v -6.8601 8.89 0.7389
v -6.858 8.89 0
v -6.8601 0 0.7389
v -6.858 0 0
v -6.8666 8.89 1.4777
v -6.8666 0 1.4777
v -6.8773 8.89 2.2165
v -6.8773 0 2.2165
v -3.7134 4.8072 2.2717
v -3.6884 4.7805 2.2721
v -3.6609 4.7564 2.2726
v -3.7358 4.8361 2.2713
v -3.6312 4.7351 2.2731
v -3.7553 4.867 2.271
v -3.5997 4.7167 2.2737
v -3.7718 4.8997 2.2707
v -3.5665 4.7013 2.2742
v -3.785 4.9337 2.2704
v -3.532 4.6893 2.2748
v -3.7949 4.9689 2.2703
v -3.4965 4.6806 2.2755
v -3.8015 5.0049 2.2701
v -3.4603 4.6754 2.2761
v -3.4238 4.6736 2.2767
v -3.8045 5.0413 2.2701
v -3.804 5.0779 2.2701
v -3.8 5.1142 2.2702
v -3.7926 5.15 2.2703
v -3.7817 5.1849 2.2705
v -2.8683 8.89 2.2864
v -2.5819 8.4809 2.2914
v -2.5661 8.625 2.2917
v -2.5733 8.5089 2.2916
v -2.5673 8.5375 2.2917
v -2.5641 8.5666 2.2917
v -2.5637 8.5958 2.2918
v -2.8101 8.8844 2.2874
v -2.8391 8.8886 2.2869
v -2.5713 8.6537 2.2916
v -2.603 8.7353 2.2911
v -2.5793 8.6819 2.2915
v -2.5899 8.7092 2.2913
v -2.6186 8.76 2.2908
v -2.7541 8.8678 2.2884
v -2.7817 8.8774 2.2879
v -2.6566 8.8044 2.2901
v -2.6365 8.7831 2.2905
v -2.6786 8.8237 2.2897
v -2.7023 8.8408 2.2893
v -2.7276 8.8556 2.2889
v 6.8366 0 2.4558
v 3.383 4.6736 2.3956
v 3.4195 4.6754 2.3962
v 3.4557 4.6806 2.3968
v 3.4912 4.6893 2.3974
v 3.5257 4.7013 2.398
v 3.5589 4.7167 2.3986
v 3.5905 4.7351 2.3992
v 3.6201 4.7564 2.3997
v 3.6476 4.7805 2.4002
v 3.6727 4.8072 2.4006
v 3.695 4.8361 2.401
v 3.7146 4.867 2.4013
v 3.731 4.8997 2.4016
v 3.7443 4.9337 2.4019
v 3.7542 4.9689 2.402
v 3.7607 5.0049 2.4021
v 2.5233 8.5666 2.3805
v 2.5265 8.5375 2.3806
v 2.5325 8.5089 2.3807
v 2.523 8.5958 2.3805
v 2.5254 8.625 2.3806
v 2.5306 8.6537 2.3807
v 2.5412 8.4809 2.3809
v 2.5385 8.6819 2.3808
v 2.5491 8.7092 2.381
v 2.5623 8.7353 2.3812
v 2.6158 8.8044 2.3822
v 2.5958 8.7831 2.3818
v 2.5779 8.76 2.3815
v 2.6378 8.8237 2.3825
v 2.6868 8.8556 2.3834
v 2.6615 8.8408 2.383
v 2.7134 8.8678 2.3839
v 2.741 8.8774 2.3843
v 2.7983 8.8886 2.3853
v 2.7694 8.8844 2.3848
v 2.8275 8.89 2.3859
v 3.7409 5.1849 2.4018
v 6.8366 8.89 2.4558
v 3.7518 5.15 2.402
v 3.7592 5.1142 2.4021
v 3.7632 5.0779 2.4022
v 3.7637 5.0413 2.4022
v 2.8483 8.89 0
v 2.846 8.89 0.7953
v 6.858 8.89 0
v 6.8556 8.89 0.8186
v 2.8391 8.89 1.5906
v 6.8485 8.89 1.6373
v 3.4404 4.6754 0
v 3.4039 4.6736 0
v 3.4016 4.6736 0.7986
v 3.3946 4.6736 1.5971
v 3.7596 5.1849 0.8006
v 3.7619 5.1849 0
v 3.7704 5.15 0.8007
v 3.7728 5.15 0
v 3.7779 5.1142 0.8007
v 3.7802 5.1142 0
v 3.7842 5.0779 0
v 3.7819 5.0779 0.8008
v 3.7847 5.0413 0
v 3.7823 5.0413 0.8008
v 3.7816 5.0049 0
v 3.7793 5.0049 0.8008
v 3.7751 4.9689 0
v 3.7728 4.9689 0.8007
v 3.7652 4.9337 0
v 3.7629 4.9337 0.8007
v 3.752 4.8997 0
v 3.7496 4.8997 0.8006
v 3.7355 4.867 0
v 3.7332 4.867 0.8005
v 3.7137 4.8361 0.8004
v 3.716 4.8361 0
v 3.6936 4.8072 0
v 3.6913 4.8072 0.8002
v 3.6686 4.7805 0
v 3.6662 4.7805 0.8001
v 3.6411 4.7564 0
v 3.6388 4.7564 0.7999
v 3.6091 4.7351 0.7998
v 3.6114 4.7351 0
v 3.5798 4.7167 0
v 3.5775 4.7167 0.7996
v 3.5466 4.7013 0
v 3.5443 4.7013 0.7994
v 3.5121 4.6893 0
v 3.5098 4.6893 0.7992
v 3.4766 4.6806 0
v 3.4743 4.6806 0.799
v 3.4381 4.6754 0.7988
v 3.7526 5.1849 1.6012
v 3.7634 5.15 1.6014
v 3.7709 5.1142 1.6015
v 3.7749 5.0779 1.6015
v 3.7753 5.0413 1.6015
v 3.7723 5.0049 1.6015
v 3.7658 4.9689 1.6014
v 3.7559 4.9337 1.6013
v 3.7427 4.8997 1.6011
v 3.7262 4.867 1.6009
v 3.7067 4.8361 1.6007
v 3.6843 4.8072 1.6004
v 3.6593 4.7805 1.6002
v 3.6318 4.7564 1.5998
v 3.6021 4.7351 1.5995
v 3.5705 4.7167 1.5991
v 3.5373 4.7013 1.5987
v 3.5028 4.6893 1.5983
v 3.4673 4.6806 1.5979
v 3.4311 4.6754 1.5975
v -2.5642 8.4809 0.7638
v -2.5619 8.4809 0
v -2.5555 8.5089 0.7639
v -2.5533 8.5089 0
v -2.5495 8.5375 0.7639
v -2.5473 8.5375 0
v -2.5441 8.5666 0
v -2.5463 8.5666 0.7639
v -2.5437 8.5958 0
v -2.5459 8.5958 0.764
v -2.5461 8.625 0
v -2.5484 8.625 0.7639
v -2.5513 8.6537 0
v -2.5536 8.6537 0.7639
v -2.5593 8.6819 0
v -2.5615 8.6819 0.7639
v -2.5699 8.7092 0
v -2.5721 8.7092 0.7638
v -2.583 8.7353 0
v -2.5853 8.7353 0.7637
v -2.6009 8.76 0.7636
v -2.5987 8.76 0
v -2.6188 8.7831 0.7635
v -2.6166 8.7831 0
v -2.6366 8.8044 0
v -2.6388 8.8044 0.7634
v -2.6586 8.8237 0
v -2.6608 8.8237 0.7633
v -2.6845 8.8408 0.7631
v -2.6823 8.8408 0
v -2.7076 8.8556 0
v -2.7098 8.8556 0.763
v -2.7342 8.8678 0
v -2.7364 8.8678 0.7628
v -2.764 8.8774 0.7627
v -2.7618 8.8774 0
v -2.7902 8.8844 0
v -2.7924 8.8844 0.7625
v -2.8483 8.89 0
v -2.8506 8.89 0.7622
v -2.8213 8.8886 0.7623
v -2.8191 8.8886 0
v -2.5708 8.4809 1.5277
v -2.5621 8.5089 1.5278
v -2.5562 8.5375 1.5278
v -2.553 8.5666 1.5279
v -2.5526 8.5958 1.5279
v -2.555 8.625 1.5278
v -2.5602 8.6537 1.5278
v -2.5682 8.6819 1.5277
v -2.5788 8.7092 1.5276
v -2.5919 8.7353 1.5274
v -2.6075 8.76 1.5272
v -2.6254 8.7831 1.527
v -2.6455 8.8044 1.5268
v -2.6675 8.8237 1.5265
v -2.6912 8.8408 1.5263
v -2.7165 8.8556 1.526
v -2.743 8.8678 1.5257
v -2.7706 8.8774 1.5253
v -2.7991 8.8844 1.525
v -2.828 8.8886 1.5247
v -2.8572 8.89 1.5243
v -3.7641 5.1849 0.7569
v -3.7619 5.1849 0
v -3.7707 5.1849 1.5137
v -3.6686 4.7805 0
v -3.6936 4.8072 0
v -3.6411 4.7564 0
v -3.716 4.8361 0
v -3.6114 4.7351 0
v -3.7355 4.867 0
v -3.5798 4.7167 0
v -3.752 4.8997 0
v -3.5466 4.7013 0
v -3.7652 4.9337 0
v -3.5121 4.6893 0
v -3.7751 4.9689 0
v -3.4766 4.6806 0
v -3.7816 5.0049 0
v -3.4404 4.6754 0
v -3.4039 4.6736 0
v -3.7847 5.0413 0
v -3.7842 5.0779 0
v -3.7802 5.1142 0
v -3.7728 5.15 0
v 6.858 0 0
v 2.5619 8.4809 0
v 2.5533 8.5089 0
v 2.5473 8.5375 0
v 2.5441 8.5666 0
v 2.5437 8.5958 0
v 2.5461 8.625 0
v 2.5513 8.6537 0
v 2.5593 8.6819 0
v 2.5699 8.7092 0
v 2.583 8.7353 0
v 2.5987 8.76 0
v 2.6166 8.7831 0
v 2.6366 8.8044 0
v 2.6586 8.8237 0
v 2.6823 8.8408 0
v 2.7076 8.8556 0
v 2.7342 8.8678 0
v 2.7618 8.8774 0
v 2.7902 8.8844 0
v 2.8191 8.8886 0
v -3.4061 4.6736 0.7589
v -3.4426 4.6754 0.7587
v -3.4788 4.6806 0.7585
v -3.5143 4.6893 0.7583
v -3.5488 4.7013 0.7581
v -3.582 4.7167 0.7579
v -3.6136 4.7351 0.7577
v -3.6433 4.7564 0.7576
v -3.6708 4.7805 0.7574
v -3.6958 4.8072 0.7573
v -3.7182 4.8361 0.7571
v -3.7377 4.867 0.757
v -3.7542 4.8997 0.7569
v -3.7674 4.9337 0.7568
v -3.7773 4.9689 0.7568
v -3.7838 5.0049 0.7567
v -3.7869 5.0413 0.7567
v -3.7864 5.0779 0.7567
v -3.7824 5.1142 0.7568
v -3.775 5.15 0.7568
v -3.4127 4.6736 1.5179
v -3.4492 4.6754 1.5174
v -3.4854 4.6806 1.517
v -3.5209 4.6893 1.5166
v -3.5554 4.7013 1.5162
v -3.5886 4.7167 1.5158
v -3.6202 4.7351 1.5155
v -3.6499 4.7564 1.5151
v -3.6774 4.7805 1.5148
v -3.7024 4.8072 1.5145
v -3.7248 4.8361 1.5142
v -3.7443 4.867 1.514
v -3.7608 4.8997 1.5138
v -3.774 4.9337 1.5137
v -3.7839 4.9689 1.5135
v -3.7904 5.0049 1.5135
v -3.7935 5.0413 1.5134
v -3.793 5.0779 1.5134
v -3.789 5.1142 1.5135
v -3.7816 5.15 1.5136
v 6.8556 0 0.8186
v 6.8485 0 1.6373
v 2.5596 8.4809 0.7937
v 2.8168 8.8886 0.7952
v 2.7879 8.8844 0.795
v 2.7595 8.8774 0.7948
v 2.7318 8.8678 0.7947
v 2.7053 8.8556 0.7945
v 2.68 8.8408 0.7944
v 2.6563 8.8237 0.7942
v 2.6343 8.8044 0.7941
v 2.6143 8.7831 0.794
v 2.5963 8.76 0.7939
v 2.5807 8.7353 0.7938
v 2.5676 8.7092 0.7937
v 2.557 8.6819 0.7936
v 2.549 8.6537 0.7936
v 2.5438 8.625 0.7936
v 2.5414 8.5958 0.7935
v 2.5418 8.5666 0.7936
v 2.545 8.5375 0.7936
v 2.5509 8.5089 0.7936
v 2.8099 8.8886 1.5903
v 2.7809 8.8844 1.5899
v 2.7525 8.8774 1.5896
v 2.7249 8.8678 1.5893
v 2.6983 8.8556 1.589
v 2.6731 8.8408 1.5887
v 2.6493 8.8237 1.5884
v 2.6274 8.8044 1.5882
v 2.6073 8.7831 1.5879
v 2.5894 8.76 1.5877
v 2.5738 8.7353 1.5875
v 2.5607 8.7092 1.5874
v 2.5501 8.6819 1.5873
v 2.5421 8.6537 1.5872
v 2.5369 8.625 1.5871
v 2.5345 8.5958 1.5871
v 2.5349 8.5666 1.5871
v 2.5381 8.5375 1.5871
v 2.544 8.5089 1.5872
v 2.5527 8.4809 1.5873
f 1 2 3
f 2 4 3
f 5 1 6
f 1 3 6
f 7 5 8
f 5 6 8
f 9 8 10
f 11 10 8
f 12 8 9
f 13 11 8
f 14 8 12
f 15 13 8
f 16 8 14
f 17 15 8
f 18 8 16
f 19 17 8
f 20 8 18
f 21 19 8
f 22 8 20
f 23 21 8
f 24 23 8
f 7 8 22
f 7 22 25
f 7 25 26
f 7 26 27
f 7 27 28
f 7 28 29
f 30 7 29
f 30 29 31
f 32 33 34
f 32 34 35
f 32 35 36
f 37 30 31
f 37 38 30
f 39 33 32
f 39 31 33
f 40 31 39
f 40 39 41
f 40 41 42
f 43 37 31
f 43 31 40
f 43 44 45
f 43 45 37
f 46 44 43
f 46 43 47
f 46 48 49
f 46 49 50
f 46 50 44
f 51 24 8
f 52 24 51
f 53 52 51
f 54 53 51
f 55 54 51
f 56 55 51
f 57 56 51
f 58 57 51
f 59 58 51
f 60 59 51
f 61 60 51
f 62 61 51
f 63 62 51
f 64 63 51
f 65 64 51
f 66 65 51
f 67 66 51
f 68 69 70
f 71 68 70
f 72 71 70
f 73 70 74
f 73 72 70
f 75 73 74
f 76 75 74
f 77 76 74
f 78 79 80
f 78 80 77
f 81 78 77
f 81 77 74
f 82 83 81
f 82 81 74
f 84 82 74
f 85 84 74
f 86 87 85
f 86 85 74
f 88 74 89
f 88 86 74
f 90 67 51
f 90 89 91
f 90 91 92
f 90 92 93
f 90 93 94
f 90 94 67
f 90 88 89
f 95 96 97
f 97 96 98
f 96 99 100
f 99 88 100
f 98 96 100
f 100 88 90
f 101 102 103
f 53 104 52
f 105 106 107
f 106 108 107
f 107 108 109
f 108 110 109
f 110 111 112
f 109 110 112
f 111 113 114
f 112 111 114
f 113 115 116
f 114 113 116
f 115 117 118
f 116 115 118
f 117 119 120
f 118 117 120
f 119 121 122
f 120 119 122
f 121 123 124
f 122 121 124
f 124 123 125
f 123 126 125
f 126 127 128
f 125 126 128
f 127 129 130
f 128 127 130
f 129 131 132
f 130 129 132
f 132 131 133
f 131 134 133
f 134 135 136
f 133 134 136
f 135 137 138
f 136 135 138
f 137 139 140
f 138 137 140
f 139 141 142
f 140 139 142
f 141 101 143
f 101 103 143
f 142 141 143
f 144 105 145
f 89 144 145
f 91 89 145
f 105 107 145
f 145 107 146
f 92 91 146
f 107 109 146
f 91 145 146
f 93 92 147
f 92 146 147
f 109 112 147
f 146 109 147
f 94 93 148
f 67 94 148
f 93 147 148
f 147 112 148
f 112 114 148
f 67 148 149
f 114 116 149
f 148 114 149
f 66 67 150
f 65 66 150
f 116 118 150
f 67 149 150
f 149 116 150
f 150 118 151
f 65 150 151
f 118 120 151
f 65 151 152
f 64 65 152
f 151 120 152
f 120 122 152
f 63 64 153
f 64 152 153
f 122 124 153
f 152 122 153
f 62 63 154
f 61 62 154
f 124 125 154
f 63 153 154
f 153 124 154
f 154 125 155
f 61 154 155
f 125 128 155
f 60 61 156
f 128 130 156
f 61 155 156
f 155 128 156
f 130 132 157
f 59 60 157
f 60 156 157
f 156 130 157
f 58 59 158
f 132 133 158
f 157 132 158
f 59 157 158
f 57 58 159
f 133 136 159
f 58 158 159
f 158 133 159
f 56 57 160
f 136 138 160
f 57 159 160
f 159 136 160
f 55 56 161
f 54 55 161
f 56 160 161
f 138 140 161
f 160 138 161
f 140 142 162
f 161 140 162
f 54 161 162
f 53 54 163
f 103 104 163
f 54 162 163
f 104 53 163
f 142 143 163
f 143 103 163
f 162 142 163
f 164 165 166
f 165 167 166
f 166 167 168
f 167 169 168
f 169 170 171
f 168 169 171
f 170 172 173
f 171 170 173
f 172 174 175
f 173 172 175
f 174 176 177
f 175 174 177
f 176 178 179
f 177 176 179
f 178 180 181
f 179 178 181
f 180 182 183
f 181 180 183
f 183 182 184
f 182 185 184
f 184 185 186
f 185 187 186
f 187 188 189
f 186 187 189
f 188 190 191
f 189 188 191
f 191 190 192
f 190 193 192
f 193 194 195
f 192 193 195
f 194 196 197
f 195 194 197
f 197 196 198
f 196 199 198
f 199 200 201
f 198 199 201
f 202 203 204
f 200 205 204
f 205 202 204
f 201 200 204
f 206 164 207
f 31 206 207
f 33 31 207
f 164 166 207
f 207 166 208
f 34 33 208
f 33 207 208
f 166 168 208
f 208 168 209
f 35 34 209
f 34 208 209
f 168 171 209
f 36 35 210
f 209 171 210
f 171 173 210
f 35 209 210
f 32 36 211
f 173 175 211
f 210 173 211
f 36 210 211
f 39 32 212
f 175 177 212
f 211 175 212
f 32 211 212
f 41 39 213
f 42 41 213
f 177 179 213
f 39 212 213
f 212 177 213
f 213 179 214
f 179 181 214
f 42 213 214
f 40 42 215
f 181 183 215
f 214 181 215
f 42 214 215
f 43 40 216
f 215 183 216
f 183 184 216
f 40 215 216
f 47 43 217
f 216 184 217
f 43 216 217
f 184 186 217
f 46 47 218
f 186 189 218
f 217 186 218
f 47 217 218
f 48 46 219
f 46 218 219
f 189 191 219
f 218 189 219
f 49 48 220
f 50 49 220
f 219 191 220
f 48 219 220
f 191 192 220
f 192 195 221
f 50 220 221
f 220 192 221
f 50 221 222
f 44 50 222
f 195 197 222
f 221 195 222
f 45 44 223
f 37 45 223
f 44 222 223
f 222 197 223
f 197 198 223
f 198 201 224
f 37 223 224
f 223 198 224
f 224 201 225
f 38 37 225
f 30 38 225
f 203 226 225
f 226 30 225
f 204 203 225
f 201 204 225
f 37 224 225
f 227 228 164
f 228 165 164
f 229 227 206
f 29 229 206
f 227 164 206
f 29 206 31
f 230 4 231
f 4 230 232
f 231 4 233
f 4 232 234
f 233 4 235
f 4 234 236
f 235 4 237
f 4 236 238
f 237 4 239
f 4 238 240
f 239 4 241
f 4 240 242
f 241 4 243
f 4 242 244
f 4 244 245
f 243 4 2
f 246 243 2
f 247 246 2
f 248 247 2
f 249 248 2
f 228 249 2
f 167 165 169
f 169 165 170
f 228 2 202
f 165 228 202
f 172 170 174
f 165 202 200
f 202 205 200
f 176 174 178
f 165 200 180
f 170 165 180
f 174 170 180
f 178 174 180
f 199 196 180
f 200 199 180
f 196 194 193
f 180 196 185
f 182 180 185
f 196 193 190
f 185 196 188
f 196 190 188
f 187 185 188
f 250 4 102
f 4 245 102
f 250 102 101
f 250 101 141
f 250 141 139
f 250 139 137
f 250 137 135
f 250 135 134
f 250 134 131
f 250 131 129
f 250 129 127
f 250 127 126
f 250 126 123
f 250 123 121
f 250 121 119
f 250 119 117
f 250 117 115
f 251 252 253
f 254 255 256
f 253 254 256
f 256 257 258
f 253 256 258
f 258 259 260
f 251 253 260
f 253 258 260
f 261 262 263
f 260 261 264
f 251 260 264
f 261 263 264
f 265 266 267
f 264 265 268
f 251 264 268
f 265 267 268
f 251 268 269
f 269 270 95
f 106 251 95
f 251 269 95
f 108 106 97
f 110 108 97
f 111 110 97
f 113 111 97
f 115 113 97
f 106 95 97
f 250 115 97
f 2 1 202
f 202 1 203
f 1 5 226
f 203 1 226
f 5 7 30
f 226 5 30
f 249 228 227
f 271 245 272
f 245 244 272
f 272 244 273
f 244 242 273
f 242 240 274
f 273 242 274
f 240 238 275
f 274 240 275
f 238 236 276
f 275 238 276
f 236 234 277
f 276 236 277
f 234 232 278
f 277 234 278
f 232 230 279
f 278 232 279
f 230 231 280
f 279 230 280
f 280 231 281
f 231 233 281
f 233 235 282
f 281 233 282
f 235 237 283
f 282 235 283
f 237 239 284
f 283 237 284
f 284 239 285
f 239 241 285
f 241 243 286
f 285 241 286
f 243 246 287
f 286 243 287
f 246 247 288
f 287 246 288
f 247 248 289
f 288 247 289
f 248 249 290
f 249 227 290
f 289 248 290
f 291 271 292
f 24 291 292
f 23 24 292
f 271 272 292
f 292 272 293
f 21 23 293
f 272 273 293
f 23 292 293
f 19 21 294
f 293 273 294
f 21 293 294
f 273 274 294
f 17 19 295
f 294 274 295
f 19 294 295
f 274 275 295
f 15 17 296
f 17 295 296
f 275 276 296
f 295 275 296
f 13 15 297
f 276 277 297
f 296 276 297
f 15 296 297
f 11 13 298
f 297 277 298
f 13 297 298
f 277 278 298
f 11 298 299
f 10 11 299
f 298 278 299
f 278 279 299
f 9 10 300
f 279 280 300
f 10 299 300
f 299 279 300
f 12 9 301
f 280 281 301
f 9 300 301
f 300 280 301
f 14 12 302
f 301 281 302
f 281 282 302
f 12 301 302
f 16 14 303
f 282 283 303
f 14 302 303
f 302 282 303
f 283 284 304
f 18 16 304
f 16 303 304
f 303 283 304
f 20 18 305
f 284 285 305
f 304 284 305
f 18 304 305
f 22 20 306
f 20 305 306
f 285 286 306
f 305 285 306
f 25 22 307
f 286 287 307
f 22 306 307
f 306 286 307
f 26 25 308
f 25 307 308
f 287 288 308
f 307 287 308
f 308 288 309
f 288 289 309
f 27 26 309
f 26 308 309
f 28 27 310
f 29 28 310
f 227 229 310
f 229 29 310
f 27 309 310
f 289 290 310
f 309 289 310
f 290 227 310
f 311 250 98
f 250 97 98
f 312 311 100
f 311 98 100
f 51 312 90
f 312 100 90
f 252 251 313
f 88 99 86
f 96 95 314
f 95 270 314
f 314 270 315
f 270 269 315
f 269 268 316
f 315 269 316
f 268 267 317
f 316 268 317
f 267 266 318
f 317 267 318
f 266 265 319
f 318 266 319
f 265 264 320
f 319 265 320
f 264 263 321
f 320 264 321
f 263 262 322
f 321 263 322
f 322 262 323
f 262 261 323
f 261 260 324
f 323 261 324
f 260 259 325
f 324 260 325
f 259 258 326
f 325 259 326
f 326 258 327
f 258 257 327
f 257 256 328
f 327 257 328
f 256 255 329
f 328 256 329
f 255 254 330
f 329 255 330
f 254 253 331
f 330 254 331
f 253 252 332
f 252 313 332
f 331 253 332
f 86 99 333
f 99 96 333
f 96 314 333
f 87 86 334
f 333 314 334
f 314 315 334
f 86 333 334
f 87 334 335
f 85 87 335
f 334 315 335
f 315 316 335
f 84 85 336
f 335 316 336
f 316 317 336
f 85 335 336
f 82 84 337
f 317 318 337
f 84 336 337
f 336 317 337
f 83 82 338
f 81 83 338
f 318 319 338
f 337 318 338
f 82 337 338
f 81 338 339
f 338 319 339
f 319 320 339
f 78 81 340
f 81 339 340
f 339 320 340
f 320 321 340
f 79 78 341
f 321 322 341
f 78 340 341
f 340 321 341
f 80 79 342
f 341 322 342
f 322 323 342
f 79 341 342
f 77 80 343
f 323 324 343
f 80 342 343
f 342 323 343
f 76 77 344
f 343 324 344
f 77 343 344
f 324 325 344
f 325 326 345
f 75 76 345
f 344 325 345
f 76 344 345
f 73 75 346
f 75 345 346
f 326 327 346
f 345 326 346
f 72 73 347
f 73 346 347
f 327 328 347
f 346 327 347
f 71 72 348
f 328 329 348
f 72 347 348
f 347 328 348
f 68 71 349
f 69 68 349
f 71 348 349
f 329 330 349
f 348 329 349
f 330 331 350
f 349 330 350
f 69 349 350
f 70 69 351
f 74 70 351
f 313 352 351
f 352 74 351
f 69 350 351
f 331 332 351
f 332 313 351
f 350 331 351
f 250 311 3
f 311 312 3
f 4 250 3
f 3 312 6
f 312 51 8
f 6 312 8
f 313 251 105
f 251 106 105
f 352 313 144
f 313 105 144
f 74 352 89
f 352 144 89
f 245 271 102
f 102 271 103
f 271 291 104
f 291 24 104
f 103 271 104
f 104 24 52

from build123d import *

# Parameters (mm, degrees)
REVOLVE1_ANGLE = 1


with BuildPart() as part:
    # Sketch1 → Revolve1 (revolve)
    with BuildSketch(Plane.XY):
        with BuildLine():
            Line((-6.858, 0), (6.858, 0))
            Line((6.858, 0), (6.858, 8.89))
            Line((6.858, 8.89), (2.848341014, 8.89))
            ThreePointArc((2.848341014, 8.89), (2.598655598, 8.76001488), (2.561932025, 8.480926511))
            Line((2.561932025, 8.480926511), (3.761907297, 5.1849418))
            ThreePointArc((3.761907297, 5.1849418), (3.716002836, 4.83608138), (3.403896102, 4.6736))
            Line((3.403896102, 4.6736), (-3.403896102, 4.6736))
            ThreePointArc((-3.403896102, 4.6736), (-3.716002836, 4.83608138), (-3.761907297, 5.1849418))
            Line((-3.761907297, 5.1849418), (-2.561932025, 8.480926511))
            ThreePointArc((-2.561932025, 8.480926511), (-2.598655598, 8.76001488), (-2.848341014, 8.89))
            Line((-2.848341014, 8.89), (-6.858, 8.89))
            Line((-6.858, 8.89), (-6.858, 0))
        make_face()
    revolve(axis=Axis((-133.858, 15.851032083, 0), (0, -1, 0)), revolution_arc=REVOLVE1_ANGLE)


solid = part.part
